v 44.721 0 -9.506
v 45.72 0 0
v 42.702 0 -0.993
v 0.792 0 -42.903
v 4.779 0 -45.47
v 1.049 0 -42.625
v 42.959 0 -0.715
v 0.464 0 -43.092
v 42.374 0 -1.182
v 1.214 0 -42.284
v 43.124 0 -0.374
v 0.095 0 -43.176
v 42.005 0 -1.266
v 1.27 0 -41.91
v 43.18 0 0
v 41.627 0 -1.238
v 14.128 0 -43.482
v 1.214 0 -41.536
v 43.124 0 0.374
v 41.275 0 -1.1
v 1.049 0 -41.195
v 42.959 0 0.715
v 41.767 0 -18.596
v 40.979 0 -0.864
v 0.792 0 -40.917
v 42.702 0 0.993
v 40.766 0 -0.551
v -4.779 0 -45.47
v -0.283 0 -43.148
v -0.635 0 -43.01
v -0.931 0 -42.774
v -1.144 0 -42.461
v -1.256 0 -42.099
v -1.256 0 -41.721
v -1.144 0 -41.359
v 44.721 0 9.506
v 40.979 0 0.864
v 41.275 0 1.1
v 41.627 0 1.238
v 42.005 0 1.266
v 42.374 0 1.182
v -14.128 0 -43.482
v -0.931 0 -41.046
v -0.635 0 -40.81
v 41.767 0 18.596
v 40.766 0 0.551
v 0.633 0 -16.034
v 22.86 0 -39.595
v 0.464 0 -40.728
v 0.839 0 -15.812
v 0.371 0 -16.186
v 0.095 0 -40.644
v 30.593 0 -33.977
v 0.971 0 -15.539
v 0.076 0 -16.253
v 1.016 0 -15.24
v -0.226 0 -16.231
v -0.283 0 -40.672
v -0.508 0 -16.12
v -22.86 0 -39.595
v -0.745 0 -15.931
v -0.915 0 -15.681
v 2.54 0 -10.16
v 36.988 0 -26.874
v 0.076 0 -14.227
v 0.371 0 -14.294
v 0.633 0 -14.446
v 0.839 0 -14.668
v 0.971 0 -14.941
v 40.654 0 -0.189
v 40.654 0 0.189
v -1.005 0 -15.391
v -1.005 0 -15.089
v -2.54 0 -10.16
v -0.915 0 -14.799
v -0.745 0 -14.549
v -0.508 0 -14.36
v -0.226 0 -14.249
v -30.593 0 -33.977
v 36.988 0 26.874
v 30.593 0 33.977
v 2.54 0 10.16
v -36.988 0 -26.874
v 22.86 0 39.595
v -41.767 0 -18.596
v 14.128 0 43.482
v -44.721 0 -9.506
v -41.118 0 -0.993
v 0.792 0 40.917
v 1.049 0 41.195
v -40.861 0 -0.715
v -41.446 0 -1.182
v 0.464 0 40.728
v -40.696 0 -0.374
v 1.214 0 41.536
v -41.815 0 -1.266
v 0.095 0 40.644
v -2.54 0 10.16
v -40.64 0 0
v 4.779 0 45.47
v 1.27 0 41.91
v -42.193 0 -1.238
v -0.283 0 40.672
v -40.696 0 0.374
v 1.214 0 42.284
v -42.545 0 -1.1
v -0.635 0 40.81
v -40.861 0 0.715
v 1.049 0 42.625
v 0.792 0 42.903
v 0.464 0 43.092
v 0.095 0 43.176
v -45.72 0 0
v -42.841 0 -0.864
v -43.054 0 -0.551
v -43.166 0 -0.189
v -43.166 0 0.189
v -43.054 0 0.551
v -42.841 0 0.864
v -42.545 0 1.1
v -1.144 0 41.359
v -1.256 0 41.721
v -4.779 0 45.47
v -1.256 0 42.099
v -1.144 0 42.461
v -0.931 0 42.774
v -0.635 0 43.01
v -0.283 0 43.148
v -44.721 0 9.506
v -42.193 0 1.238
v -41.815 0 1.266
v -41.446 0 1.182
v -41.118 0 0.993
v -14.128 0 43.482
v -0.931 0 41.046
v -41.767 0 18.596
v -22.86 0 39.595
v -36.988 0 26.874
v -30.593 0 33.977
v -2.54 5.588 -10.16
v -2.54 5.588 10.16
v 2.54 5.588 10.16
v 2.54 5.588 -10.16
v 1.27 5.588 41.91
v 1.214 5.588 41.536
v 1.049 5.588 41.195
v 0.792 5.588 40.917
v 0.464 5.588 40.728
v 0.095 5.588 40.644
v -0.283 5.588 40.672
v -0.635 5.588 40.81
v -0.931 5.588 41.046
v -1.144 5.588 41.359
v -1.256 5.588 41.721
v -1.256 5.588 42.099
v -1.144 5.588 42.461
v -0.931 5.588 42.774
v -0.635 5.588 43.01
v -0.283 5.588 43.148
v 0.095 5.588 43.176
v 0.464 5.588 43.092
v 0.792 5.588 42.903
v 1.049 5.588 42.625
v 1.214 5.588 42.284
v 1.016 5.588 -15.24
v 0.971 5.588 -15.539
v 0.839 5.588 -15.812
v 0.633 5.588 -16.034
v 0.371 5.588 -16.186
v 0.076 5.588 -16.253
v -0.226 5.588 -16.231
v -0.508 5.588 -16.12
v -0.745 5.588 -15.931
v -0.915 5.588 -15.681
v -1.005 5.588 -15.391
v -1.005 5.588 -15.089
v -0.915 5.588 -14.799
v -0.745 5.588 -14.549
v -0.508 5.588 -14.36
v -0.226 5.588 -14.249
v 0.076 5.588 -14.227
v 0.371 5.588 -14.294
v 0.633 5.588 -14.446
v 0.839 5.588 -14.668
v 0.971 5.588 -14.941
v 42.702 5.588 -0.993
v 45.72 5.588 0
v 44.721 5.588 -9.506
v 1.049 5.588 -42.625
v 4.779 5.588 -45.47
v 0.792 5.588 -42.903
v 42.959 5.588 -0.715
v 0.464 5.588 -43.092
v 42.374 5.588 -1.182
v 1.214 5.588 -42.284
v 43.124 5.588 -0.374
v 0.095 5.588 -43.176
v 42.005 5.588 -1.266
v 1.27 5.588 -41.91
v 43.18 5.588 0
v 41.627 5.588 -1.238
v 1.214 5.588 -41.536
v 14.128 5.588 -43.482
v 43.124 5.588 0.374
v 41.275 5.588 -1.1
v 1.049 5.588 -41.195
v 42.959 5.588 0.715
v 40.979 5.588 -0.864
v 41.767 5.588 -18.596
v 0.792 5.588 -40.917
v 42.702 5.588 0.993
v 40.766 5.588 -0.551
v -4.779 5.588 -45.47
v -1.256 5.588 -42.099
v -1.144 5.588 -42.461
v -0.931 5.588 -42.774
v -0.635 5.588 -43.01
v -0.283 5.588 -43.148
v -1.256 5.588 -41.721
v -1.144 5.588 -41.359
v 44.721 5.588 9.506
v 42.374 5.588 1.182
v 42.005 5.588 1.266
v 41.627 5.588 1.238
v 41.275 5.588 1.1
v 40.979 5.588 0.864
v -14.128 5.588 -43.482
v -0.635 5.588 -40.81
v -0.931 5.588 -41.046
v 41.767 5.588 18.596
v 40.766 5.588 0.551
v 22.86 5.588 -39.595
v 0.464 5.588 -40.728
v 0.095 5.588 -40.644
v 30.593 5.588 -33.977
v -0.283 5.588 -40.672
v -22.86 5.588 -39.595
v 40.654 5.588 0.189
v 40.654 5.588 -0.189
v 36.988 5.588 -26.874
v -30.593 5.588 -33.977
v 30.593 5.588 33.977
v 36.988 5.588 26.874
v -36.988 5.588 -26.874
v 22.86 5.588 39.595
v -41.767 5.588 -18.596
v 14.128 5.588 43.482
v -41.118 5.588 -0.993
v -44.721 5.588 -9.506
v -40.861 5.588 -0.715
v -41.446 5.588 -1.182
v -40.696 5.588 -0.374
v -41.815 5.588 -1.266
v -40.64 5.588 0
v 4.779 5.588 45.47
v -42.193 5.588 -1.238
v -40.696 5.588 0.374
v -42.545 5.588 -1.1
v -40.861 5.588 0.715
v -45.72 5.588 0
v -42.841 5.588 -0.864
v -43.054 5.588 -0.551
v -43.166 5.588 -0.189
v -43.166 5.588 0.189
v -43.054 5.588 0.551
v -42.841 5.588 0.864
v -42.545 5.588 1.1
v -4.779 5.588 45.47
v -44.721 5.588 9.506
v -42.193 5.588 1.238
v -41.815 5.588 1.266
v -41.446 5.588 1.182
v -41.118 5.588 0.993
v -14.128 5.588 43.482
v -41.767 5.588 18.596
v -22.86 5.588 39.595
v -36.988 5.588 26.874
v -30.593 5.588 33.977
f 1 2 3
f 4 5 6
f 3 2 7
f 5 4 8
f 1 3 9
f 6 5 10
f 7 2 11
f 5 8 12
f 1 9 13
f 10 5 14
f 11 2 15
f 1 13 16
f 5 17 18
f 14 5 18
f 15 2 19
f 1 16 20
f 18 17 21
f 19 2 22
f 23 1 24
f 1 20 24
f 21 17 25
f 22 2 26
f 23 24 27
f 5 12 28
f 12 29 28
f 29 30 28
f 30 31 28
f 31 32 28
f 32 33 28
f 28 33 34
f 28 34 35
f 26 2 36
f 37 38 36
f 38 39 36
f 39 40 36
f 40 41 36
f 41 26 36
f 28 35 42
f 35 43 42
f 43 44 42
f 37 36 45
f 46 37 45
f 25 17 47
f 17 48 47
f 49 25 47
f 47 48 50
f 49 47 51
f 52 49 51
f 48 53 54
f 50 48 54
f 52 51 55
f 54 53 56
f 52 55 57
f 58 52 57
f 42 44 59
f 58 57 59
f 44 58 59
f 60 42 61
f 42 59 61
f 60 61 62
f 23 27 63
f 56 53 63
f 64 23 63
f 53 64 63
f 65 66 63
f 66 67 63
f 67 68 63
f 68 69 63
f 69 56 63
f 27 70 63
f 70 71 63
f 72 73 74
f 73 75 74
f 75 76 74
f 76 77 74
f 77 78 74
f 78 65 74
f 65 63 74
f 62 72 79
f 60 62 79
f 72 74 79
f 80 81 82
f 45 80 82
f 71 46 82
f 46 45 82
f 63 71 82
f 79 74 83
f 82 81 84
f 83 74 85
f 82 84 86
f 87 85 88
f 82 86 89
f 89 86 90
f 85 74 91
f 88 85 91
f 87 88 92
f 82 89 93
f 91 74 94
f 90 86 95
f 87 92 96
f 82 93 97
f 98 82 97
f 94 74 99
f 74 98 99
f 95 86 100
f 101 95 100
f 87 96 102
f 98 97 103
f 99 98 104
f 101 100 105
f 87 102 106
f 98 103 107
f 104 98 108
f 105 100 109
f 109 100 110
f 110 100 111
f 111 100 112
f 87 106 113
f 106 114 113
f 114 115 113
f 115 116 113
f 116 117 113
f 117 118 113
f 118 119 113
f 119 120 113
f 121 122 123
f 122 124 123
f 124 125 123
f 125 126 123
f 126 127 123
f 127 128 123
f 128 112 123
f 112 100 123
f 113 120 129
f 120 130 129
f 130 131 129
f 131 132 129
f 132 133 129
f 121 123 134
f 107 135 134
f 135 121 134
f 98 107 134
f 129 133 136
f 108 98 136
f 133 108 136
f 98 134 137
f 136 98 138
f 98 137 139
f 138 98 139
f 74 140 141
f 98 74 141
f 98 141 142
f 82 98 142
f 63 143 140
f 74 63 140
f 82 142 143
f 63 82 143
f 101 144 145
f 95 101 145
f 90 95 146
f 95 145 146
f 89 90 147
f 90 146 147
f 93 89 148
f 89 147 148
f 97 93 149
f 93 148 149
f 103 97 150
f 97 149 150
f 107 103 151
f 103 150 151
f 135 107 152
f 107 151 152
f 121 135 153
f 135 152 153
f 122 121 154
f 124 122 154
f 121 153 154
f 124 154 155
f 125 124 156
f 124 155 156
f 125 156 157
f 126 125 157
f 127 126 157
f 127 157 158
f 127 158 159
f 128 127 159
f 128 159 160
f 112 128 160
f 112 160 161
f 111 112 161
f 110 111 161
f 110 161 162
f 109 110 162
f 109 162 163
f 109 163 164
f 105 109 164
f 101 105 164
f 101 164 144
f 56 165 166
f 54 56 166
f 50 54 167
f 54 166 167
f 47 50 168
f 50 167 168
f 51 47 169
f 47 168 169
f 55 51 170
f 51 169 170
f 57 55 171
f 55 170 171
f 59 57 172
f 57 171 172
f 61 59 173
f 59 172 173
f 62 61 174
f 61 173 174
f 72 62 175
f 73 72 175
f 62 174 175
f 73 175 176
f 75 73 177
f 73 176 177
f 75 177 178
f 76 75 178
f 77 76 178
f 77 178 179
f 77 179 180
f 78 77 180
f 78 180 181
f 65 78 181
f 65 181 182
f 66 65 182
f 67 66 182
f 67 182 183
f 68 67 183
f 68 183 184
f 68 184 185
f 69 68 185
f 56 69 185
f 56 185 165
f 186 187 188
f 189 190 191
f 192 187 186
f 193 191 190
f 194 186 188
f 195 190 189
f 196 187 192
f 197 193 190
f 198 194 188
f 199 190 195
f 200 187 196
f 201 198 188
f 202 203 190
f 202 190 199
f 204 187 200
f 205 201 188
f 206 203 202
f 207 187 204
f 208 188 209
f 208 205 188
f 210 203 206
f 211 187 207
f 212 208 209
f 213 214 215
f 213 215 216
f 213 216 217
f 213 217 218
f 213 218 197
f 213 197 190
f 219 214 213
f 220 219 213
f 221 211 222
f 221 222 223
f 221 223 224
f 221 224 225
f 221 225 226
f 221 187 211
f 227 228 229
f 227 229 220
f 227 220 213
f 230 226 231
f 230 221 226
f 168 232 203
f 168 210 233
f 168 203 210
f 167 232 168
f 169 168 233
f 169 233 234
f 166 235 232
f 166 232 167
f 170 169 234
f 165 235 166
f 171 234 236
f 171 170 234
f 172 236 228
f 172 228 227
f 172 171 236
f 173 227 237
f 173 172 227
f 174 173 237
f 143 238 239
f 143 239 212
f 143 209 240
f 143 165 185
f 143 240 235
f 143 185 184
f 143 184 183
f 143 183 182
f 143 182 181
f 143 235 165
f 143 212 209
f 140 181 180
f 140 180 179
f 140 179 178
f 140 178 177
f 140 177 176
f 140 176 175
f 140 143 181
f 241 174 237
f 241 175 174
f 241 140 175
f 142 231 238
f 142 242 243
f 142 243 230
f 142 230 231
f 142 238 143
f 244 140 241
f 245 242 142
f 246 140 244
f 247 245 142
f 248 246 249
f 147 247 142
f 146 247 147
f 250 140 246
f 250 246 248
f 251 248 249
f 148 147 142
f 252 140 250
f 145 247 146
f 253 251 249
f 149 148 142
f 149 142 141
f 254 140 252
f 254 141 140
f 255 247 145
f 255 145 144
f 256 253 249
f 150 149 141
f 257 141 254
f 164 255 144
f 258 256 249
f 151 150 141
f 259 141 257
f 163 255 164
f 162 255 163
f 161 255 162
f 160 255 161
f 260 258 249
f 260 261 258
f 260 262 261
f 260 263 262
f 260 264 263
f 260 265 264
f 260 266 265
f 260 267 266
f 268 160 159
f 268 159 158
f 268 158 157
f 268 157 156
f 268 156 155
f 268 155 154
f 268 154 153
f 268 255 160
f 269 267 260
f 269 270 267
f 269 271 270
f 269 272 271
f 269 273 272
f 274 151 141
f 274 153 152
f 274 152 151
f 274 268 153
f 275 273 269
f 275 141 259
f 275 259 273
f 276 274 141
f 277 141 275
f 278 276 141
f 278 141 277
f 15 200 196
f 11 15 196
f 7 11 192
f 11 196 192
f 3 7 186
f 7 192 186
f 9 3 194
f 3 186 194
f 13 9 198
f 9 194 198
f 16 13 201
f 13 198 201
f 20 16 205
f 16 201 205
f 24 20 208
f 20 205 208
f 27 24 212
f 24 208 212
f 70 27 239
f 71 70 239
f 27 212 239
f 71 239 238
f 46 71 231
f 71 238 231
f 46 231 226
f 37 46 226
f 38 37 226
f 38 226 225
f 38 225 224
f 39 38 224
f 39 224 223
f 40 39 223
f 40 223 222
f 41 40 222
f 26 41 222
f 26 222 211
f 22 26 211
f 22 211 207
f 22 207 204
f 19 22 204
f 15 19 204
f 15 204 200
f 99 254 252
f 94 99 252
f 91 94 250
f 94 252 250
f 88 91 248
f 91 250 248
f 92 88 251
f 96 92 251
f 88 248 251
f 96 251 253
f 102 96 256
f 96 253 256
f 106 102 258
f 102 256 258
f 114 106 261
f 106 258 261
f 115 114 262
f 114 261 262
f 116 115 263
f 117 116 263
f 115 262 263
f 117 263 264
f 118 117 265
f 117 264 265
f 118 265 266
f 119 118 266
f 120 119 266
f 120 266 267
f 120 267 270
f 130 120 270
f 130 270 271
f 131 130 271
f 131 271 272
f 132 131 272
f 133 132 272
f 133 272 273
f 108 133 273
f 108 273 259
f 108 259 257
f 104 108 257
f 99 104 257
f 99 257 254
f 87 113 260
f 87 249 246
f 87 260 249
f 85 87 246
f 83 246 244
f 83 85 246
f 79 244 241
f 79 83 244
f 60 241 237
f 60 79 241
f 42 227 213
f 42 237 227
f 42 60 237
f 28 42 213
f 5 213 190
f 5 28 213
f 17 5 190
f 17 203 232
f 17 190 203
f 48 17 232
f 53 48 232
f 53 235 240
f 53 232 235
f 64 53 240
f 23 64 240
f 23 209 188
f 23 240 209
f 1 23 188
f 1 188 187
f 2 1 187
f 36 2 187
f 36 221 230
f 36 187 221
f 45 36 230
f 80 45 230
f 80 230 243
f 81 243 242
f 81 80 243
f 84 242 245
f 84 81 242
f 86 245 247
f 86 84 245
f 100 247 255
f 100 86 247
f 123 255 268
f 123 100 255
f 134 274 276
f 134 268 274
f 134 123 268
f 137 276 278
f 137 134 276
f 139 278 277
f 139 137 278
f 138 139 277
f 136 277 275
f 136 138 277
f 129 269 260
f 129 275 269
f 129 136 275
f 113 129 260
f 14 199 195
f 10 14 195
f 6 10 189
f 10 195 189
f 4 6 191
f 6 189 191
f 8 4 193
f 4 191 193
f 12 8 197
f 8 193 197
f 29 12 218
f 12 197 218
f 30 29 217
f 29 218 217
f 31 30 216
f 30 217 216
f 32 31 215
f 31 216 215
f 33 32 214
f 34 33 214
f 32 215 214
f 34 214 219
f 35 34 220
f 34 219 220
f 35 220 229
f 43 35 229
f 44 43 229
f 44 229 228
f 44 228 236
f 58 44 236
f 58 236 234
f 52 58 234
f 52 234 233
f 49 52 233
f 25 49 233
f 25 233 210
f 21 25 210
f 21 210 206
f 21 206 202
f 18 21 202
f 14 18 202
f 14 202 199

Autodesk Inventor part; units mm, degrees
ref_plane "YZ Plane" through (0, 0, 0) normal (1, 0, 0) x (0, 1, 0)
ref_plane "XZ Plane" through (0, 0, 0) normal (0, 1, 0) x (-1, 0, 0)
ref_plane "XY Plane" through (0, 0, 0) normal (0, 0, 1) x (1, 0, 0)
sketch "Sketch1" plane through (0, 0, 0) normal (0, 1, 0) x (-1, 0, 0)
  circle A0 centre (0, 0) radius 45.72
  dimension "d0" = 91.44
extrude "Extrusion1" add sketch "Sketch1" along normal blind 5.588
sketch "Sketch2" plane through (0, 5.588, 0) normal (0, 1, 0) x (1, 0, 0)
  circle A0 centre (0, 0) radius 38.1
  line L0 (0, 0) -> (-41.91, 0)
  line L1 (0, 0) -> (0, 41.91)
  line L2 (0, 0) -> (41.91, 0)
  line L3 (0, 0) -> (0, -41.91)
  circle A1 centre (-41.91, 0) radius 1.27
  circle A2 centre (0, -41.91) radius 1.27
  circle A3 centre (0, 41.91) radius 1.27
  circle A4 centre (41.91, 0) radius 1.27
  line L4 (0, 0) -> (0, -10.16)
  line L5 (0, -10.16) -> (-2.54, -10.16)
  line L6 (-2.54, -10.16) -> (2.54, -10.16)
  line L7 (2.54, -10.16) -> (2.54, 10.16)
  line L8 (2.54, 10.16) -> (-2.54, 10.16)
  line L9 (-2.54, 10.16) -> (-2.54, -10.16)
  line L10 (0, 0) -> (0, 15.24)
  circle A5 centre (0, 15.24) radius 1.016
  dimension "d3" = 76.2
  dimension "d4" = 41.91
  dimension "d5" = 41.91
  dimension "d6" = 41.91
  dimension "d7" = 41.91
  dimension "d8" = 2.54
  dimension "d9" = 2.54
  dimension "d10" = 2.54
  dimension "d11" = 2.54
  dimension "d12" = 10.16
  dimension "d13" = 2.54
  dimension "d14" = 5.08
  dimension "d15" = 20.32
  dimension "d16" = 15.24
  dimension "d17" = 2.032
extrude "Extrusion2" cut sketch "Sketch2" against normal blind 5.588 contours A2 | A1 | A3 | A4 | L7 L6 L3 L2 | L2 L1 L8 L7 | A5 L1 | L1 A5 | L5 L9 L0 L3 | L0 L9 L8 L1
properties part number "open1" material "Plastic, Transparent"
